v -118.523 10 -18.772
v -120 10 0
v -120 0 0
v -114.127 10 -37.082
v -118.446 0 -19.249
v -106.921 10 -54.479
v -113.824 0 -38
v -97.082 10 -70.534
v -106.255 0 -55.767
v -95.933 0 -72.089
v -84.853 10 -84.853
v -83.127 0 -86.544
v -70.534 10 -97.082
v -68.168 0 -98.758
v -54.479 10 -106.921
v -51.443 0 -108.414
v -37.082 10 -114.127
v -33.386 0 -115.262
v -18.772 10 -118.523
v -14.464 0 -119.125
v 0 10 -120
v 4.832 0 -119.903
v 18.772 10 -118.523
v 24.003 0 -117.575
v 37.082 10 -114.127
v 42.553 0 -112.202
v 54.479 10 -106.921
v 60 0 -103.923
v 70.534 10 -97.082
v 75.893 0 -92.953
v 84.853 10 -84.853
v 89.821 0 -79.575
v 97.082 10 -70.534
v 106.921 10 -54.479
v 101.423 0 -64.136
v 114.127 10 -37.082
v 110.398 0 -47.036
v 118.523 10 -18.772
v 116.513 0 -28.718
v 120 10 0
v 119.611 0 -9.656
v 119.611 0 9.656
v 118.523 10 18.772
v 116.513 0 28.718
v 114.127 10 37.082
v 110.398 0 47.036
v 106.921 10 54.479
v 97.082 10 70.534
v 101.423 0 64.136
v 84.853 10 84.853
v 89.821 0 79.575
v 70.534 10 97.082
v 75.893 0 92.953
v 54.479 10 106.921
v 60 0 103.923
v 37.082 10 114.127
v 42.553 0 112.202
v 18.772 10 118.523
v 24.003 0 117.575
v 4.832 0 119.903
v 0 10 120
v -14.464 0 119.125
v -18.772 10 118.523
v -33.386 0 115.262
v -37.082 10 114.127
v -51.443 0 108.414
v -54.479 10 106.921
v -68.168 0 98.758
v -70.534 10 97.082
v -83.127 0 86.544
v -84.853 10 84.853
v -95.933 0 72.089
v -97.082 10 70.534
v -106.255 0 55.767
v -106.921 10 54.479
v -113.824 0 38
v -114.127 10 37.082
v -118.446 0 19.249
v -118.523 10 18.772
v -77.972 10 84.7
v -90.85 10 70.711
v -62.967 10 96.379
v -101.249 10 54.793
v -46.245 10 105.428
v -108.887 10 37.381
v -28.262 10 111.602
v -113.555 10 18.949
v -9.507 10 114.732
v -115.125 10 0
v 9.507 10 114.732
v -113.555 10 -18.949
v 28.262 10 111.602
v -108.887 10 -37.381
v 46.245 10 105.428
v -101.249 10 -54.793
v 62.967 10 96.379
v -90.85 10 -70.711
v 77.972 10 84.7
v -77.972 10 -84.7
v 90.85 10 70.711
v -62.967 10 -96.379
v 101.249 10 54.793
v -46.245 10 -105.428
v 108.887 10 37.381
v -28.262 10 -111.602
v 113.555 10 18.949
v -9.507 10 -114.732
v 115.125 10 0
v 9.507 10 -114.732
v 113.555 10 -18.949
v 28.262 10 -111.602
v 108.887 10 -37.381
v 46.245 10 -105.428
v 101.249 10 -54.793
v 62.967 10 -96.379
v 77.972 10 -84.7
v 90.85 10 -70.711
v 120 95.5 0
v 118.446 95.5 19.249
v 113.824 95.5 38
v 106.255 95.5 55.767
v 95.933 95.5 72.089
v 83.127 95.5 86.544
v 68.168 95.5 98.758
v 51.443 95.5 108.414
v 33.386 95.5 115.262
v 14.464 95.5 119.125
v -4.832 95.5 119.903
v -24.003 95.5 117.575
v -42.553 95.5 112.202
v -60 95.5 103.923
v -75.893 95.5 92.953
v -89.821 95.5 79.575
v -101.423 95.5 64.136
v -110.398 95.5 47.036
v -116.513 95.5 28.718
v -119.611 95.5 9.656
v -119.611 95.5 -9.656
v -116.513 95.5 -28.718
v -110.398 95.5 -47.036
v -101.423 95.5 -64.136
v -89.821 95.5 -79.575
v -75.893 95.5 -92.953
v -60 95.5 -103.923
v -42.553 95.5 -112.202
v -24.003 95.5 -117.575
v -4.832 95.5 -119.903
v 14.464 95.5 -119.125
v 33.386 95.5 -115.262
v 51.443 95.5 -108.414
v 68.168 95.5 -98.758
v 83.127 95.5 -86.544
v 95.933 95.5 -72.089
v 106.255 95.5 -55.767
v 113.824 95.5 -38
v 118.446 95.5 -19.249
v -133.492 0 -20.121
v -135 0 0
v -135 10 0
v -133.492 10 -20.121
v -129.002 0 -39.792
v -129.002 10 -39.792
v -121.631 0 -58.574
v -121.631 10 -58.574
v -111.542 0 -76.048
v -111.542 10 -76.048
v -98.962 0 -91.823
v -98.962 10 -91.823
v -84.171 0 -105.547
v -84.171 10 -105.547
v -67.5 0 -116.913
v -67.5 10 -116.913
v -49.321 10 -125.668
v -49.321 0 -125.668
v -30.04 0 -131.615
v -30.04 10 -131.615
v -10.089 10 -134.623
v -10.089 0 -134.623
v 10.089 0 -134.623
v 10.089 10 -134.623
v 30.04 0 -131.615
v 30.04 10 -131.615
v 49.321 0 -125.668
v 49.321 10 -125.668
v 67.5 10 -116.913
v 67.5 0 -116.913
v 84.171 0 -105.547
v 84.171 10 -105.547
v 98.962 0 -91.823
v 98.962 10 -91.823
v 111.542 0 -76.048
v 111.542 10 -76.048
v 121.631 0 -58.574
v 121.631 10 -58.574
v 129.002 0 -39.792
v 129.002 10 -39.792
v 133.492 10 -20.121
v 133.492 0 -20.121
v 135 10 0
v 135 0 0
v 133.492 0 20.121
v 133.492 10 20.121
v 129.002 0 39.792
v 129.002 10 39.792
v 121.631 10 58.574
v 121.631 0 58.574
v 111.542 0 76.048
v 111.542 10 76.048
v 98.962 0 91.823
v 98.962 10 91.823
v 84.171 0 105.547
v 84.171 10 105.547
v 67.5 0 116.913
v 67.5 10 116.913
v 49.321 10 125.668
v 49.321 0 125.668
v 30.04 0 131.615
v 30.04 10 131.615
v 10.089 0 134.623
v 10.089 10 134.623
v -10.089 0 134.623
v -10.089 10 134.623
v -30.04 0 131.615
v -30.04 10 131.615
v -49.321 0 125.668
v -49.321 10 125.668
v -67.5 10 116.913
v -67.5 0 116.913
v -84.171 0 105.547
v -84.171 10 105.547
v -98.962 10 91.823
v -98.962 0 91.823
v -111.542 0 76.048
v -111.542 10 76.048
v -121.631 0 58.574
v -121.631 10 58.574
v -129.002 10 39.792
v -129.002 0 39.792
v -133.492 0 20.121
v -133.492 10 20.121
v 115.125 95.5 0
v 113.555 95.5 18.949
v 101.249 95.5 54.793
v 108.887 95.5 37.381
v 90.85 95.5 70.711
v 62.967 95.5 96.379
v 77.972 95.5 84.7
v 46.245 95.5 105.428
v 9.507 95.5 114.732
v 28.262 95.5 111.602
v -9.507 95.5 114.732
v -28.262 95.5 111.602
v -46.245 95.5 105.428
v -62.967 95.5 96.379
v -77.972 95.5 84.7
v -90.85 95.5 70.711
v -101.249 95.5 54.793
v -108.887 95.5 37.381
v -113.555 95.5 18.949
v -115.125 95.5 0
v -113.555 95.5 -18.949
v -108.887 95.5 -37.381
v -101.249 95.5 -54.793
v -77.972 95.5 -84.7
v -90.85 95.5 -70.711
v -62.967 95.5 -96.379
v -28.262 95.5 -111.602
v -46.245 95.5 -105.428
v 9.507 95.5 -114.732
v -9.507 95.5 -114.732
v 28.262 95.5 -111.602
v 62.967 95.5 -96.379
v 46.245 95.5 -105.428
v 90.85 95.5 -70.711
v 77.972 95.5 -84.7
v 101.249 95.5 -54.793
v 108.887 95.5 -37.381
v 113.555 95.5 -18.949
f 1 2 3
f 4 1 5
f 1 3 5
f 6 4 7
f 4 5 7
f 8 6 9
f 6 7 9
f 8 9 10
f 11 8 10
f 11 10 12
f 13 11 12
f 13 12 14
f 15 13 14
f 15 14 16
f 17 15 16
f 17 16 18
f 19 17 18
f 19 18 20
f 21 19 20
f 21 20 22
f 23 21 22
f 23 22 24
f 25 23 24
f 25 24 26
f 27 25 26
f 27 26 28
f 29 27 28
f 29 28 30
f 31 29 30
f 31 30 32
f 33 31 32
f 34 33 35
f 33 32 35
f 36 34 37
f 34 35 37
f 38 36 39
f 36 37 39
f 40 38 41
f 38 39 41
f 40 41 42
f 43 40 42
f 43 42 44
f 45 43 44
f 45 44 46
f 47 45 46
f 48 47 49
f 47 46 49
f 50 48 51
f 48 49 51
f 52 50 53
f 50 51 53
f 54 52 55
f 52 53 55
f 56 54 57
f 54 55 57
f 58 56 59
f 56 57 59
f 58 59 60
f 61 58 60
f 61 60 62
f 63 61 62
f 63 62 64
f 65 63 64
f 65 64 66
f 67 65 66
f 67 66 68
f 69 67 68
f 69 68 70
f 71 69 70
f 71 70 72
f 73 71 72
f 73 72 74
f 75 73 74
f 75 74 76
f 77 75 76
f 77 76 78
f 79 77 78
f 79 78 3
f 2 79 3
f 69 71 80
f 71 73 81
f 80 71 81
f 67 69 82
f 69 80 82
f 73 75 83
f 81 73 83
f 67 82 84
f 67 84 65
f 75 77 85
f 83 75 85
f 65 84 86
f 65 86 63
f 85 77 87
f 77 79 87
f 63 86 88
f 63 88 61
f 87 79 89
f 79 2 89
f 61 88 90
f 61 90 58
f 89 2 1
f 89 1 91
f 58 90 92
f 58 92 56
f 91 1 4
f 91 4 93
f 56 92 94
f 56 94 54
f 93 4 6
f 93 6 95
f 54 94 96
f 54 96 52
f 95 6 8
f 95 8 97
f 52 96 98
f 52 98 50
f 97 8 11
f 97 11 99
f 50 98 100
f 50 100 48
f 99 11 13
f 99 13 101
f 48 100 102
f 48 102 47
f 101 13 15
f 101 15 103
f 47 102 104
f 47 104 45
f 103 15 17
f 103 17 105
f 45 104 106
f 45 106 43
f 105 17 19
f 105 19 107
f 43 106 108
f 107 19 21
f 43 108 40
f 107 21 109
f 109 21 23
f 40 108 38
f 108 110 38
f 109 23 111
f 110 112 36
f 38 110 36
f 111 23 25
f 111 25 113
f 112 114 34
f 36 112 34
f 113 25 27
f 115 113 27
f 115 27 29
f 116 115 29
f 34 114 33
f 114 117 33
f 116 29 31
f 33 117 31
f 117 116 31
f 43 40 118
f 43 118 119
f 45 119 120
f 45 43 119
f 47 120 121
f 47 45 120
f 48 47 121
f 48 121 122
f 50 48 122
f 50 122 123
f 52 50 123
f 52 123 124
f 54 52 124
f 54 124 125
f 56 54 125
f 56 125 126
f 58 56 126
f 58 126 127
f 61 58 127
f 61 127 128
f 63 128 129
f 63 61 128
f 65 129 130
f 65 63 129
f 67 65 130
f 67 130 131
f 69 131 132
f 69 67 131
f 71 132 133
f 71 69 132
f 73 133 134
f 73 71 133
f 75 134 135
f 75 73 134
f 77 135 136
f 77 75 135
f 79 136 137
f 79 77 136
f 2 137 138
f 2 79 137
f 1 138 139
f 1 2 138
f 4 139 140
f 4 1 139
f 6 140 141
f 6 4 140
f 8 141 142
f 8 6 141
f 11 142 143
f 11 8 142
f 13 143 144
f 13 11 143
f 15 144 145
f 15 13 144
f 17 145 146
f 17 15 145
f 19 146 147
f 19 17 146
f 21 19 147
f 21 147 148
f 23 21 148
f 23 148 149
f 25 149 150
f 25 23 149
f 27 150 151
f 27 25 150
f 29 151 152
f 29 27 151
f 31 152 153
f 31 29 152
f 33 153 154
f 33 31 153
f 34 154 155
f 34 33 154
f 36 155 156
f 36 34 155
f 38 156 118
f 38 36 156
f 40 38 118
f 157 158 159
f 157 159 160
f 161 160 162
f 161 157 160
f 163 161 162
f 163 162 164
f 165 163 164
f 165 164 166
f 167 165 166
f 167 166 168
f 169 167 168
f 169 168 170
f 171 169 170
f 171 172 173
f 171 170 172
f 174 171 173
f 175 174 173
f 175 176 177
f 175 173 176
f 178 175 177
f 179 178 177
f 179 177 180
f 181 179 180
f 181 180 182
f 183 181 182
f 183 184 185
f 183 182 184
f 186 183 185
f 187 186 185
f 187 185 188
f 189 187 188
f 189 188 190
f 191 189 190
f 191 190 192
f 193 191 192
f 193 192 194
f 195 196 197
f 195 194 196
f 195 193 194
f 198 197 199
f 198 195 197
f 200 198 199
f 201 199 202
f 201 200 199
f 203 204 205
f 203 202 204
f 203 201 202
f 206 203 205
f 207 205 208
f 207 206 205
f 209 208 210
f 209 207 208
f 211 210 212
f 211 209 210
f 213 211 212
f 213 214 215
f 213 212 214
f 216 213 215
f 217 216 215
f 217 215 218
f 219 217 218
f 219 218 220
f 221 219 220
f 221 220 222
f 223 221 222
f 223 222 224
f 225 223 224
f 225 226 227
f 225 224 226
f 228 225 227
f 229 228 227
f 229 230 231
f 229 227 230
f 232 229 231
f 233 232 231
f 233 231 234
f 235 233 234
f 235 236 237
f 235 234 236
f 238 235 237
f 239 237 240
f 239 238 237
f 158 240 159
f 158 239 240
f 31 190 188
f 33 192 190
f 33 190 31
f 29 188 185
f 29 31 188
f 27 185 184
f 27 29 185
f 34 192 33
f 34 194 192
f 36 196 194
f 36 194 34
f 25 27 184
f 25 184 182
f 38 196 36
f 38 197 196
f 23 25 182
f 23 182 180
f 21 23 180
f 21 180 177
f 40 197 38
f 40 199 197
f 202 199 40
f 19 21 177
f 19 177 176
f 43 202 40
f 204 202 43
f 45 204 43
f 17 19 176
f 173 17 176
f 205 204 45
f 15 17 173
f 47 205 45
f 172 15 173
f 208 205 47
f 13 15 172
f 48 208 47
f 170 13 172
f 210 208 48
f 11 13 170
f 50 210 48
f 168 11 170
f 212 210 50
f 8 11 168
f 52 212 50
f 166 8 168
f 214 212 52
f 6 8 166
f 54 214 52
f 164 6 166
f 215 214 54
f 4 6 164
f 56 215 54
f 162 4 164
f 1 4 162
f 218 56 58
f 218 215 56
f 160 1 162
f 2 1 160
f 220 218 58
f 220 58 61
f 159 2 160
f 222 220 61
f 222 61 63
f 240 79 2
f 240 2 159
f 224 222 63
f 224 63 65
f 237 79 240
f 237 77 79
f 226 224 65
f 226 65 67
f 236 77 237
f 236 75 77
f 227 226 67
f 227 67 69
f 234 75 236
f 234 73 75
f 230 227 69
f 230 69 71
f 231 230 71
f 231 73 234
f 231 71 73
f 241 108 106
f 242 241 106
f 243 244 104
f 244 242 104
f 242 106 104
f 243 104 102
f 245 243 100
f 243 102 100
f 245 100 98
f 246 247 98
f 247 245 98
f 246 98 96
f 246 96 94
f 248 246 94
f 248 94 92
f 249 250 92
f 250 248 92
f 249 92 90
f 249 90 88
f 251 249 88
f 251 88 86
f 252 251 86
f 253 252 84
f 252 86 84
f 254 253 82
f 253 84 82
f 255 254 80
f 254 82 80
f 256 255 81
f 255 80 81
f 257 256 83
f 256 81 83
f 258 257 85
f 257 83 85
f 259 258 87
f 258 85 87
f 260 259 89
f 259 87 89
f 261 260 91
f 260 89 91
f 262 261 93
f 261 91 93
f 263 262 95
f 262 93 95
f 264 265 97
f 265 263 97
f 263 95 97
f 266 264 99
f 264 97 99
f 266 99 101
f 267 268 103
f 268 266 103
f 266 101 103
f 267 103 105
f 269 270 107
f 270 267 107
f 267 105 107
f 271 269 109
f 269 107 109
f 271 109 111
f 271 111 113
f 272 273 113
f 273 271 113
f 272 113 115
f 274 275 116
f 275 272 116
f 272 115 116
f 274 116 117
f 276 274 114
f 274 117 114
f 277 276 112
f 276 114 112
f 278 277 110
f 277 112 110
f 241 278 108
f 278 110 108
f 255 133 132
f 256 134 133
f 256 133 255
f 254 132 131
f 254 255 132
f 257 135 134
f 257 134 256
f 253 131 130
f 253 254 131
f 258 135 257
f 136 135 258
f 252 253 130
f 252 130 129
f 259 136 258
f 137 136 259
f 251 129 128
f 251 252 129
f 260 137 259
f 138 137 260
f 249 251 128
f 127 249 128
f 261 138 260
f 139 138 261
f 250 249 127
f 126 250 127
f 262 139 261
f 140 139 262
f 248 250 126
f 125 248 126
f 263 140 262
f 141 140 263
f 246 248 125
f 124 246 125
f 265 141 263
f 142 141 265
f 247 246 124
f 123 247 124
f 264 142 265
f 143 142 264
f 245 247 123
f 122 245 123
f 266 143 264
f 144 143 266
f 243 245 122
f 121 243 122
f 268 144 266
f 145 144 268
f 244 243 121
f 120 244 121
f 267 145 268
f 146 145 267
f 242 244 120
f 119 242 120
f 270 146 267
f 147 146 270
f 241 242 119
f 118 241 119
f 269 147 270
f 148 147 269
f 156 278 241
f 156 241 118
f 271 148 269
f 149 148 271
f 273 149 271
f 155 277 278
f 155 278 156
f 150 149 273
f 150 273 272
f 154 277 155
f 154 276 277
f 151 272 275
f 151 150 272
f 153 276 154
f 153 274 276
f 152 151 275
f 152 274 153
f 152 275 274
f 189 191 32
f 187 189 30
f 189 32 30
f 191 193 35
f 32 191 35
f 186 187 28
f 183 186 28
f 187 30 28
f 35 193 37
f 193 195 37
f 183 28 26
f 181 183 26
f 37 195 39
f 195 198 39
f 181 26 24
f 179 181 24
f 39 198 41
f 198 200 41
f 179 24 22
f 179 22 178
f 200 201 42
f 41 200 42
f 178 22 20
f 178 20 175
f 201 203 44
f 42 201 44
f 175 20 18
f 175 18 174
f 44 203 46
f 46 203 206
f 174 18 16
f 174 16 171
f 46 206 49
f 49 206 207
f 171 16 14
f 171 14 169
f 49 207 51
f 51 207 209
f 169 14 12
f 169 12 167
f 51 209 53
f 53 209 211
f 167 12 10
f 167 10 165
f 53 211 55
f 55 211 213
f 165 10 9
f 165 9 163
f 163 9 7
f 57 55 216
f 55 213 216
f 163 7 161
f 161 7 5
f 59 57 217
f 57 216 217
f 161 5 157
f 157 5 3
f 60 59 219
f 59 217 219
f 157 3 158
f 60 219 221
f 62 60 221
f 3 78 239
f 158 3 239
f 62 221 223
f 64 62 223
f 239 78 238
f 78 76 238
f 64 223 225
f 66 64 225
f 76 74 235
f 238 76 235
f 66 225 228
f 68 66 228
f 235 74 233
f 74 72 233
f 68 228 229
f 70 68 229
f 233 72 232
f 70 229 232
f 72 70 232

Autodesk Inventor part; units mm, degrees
ref_plane "YZ Plane" through (0, 0, 0) normal (1, 0, 0) x (0, 1, 0)
ref_plane "XZ Plane" through (0, 0, 0) normal (0, 1, 0) x (-1, 0, 0)
ref_plane "XY Plane" through (0, 0, 0) normal (0, 0, 1) x (1, 0, 0)
sketch "l" plane through (0, 0, 0) normal (0, 1, 0) x (-1, 0, 0)
  circle A0 centre (0, 0) radius 120
  circle A1 centre (0, 0) radius 135
  point P0 (0, 120)
  point P1 (0, -120)
  point P2 (0, -135)
  point P3 (0, 135)
  dimension "d0" = 240
  dimension "d1" = 270
extrude "Extrusion1" add sketch "l" along normal blind 10
sketch "Sketch2" plane through (0, 10, 0) normal (0, 1, 0) x (1, 0, 0)
  circle A0 centre (0, 0) radius 115.125
  circle A1 centre (0, 0) radius 120
  dimension "d4" = 230.25
extrude "Extrusion2" add sketch "Sketch2" along normal blind 85.5
ref_plane "Work Plane1" through (0, 0, 120) normal (0, 0, 1) x (1, 0, 0)
ref_plane "Work Plane2" through (0, 0, -120) normal (0, 0, -1) x (-1, 0, 0)
sketch "Sketch3" plane through (0, 10, 0) normal (0, 1, 0) x (1, 0, 0)
  circle A0 centre (0, 0) radius 115.125 construction
  line L0 (0, 0) -> (0, 120) construction
  circle A1 centre (0, 0) radius 120 construction
  line L1 (0, 120) -> (57.5, 120) construction
  line L2 (57.5, 120) -> (57.5, 174.798)
  line L3 (57.5, 120) -> (112.298, 120) construction
  line L4 (57.5, 174.798) -> (-57.5, 174.798)
  line L5 (-57.5, 174.798) -> (-57.5, 120)
  dimension "d7" = 120
  dimension "d8" = 54.798
  dimension "d9" = 90
  dimension "d10" = 115
  dimension "d11" = 57.5
sketch "Sketch4" plane through (0, 10, 0) normal (0, 1, 0) x (1, 0, 0)
  line L0 (-32.5, -70.125) -> (32.5, -70.125)
  line L1 (32.5, -70.125) -> (32.5, -160.125)
  line L2 (32.5, -160.125) -> (-32.5, -160.125)
  line L3 (-32.5, -160.125) -> (-32.5, -70.125)
  circle A0 centre (0, 0) radius 115.125
  line L4 (31, -71.625) -> (-31, -71.625)
  line L5 (-31, -71.625) -> (-31, -158.625)
  line L6 (-31, -158.625) -> (31, -158.625)
  line L7 (31, -158.625) -> (31, -71.625)
  arc A1 (-32.5, -118.935) -> (-46.2997, -118.8397) centre (-39.3993, -118.814) ccw
  arc A2 (46.2999, -118.8962) -> (32.5, -118.8521) centre (39.3999, -118.8962) ccw
  circle A3 centre (0, 0) radius 120
  circle A4 centre (0, 0) radius 120
  line L8 (-85.1567, -65.125) -> (-46.2997, -65.125)
  line L9 (-46.2997, -65.125) -> (-46.2997, -126.0372)
  line L10 (-85.1567, -103.8141) -> (-85.1567, -65.125)
  circle A5 centre (0, 0) radius 134.2722
  line L11 (0, -71.625) -> (0, -158.625)
  line L12 (-83.1567, -108.9509) -> (-83.1567, -67.125)
  line L13 (-83.1567, -67.125) -> (-48.0393, -67.125)
  line L14 (-48.0393, -67.125) -> (-48.0393, -125.3844)
  circle A6 centre (0, 0) radius 132.2722
  circle A7 centre (0, 0) radius 115.125
  line L15 (-85.1567, -103.8141) -> (-85.1567, -150.3591)
  line L16 (-85.1567, -103.8141) -> (-38.6117, -103.8141) construction
  line L17 (-85.1567, -150.3591) -> (-46.2997, -150.3591)
  line L18 (-46.2997, -150.3591) -> (-46.2997, -126.0372)
  line L19 (-48.0393, -125.3844) -> (-48.0393, -148.3591)
  line L20 (-48.0393, -148.3591) -> (-83.1567, -148.3591)
  line L21 (-83.1567, -148.3591) -> (-83.1567, -108.9509)
  line L22 (46.2997, -65.125) -> (46.2999, -126.0371)
  line L23 (48.0393, -67.125) -> (48.0393, -125.3844)
  line L24 (85.1567, -65.125) -> (46.2997, -65.125)
  line L25 (83.1567, -67.125) -> (48.0393, -67.125)
  line L26 (83.1567, -108.9509) -> (83.1567, -67.125)
  line L27 (85.1567, -103.8141) -> (85.1567, -65.125)
  line L28 (85.1567, -103.8141) -> (85.1567, -150.3591)
  line L29 (83.1567, -148.3591) -> (83.1567, -108.9509)
  line L30 (85.1567, -150.3591) -> (46.2997, -150.3591)
  line L31 (48.0393, -148.3591) -> (83.1567, -148.3591)
  line L32 (46.2997, -150.3591) -> (46.2999, -126.0371)
  line L33 (48.0393, -125.3844) -> (48.0393, -148.3591)
  line L34 (57.5, 70.125) -> (-57.5, 70.125)
  line L35 (-57.5, 70.125) -> (-57.5, 160.125)
  line L36 (-57.5, 160.125) -> (57.5, 160.125)
  line L37 (57.5, 160.125) -> (57.5, 70.125)
  line L38 (57.5, 70.125) -> (-57.5, 160.125) construction
  line L39 (-57.5, 70.125) -> (57.5, 160.125) construction
  line L40 (-56, 158.625) -> (-56, 71.625)
  line L41 (-56, 71.625) -> (56, 71.625)
  line L42 (56, 71.625) -> (56, 158.625)
  line L43 (56, 158.625) -> (-56, 158.625)
  point P0 (0, 0)
  point P1 (-175.3676, -192.3287)
  point P2 (0, -115.125)
  point P3 (0, -70.125)
  point P4 (37.7289, -108.0229)
  point P5 (-27.2711, -108.0229)
  point P6 (36.2289, -108.4533)
  point P7 (-25.7711, -108.4533)
  point P8 (-61.2997, -115.125)
  point P9 (75.8883, -110.77)
  point P10 (37.7289, -113.0957)
  point P11 (37.7289, -118.7724)
  point P12 (-41.0708, -118.8403)
  point P13 (-27.2711, -118.7724)
  point P14 (-27.2711, -113.0957)
  point P15 (-42.8104, -107.5452)
  point P16 (-42.8104, -120.8208)
  point P17 (-77.9278, -100.4441)
  point P18 (-77.9278, -84.0963)
  point P19 (-79.9278, -82.1284)
  point P20 (-42.8104, -102.2037)
  point P21 (-77.9278, -77.1967)
  point P22 (-25.7711, -126.1688)
  point P23 (36.2289, -126.1688)
  point P24 (-27.2711, -127.8602)
  point P25 (37.7289, -127.8602)
  point P26 (-25.7711, -113.5073)
  point P27 (36.2289, -113.5073)
  point P28 (37.7289, -125.7979)
  point P29 (-27.2711, -125.7979)
  point P30 (53.2682, -107.5452)
  point P31 (51.5286, -118.8403)
  point P32 (90.3856, -82.1284)
  point P33 (88.3856, -84.0963)
  point P34 (90.3856, -101.3947)
  point P35 (53.2682, -122.965)
  point P36 (88.3856, -103.0035)
  point P37 (-77.9278, -103.0035)
  point P38 (53.2682, -102.2037)
  point P39 (0, 115.125)
  point P40 (0, 70.125)
  point P41 (-52.2711, 123.7569)
  point P42 (-50.7711, 124.4564)
  point P43 (61.2289, 124.4564)
  point P44 (62.7289, 123.7569)
  point P45 (61.2289, 103.0066)
  point P46 (62.7289, 102.1567)
  point P47 (-52.2711, 102.1567)
  point P48 (-50.7711, 103.0066)
  point P49 (61.2289, 108.5514)
  point P50 (-50.7711, 108.5514)
  dimension "d23" = 230.25
  dimension "d12" = 65
  dimension "d13" = 1.5
  dimension "d14" = 13.8
  dimension "d15" = 240
  dimension "d16" = 2
  dimension "d17" = 38.857
  dimension "d18" = 2
  dimension "d19" = 46.545
  dimension "d20" = 90
  dimension "d21" = 2
  dimension "d22" = 264.5444
  dimension "d24" = 13.7997
  dimension "d25" = 46.2997
  dimension "d26" = 90
  dimension "d27" = 65.125
  dimension "d28" = 70.125
  dimension "d29" = 90
  dimension "d30" = 115
  dimension "d31" = 1.5
  dimension "d32" = 70.125
  dimension "d33" = 90
  dimension "d34" = 0
  dimension "d35" = 0
  dimension "d36" = 0
  dimension "d37" = 0
equation "\"d11\" = 0.5 * d10"
properties part number "CoverHolder_Both"
